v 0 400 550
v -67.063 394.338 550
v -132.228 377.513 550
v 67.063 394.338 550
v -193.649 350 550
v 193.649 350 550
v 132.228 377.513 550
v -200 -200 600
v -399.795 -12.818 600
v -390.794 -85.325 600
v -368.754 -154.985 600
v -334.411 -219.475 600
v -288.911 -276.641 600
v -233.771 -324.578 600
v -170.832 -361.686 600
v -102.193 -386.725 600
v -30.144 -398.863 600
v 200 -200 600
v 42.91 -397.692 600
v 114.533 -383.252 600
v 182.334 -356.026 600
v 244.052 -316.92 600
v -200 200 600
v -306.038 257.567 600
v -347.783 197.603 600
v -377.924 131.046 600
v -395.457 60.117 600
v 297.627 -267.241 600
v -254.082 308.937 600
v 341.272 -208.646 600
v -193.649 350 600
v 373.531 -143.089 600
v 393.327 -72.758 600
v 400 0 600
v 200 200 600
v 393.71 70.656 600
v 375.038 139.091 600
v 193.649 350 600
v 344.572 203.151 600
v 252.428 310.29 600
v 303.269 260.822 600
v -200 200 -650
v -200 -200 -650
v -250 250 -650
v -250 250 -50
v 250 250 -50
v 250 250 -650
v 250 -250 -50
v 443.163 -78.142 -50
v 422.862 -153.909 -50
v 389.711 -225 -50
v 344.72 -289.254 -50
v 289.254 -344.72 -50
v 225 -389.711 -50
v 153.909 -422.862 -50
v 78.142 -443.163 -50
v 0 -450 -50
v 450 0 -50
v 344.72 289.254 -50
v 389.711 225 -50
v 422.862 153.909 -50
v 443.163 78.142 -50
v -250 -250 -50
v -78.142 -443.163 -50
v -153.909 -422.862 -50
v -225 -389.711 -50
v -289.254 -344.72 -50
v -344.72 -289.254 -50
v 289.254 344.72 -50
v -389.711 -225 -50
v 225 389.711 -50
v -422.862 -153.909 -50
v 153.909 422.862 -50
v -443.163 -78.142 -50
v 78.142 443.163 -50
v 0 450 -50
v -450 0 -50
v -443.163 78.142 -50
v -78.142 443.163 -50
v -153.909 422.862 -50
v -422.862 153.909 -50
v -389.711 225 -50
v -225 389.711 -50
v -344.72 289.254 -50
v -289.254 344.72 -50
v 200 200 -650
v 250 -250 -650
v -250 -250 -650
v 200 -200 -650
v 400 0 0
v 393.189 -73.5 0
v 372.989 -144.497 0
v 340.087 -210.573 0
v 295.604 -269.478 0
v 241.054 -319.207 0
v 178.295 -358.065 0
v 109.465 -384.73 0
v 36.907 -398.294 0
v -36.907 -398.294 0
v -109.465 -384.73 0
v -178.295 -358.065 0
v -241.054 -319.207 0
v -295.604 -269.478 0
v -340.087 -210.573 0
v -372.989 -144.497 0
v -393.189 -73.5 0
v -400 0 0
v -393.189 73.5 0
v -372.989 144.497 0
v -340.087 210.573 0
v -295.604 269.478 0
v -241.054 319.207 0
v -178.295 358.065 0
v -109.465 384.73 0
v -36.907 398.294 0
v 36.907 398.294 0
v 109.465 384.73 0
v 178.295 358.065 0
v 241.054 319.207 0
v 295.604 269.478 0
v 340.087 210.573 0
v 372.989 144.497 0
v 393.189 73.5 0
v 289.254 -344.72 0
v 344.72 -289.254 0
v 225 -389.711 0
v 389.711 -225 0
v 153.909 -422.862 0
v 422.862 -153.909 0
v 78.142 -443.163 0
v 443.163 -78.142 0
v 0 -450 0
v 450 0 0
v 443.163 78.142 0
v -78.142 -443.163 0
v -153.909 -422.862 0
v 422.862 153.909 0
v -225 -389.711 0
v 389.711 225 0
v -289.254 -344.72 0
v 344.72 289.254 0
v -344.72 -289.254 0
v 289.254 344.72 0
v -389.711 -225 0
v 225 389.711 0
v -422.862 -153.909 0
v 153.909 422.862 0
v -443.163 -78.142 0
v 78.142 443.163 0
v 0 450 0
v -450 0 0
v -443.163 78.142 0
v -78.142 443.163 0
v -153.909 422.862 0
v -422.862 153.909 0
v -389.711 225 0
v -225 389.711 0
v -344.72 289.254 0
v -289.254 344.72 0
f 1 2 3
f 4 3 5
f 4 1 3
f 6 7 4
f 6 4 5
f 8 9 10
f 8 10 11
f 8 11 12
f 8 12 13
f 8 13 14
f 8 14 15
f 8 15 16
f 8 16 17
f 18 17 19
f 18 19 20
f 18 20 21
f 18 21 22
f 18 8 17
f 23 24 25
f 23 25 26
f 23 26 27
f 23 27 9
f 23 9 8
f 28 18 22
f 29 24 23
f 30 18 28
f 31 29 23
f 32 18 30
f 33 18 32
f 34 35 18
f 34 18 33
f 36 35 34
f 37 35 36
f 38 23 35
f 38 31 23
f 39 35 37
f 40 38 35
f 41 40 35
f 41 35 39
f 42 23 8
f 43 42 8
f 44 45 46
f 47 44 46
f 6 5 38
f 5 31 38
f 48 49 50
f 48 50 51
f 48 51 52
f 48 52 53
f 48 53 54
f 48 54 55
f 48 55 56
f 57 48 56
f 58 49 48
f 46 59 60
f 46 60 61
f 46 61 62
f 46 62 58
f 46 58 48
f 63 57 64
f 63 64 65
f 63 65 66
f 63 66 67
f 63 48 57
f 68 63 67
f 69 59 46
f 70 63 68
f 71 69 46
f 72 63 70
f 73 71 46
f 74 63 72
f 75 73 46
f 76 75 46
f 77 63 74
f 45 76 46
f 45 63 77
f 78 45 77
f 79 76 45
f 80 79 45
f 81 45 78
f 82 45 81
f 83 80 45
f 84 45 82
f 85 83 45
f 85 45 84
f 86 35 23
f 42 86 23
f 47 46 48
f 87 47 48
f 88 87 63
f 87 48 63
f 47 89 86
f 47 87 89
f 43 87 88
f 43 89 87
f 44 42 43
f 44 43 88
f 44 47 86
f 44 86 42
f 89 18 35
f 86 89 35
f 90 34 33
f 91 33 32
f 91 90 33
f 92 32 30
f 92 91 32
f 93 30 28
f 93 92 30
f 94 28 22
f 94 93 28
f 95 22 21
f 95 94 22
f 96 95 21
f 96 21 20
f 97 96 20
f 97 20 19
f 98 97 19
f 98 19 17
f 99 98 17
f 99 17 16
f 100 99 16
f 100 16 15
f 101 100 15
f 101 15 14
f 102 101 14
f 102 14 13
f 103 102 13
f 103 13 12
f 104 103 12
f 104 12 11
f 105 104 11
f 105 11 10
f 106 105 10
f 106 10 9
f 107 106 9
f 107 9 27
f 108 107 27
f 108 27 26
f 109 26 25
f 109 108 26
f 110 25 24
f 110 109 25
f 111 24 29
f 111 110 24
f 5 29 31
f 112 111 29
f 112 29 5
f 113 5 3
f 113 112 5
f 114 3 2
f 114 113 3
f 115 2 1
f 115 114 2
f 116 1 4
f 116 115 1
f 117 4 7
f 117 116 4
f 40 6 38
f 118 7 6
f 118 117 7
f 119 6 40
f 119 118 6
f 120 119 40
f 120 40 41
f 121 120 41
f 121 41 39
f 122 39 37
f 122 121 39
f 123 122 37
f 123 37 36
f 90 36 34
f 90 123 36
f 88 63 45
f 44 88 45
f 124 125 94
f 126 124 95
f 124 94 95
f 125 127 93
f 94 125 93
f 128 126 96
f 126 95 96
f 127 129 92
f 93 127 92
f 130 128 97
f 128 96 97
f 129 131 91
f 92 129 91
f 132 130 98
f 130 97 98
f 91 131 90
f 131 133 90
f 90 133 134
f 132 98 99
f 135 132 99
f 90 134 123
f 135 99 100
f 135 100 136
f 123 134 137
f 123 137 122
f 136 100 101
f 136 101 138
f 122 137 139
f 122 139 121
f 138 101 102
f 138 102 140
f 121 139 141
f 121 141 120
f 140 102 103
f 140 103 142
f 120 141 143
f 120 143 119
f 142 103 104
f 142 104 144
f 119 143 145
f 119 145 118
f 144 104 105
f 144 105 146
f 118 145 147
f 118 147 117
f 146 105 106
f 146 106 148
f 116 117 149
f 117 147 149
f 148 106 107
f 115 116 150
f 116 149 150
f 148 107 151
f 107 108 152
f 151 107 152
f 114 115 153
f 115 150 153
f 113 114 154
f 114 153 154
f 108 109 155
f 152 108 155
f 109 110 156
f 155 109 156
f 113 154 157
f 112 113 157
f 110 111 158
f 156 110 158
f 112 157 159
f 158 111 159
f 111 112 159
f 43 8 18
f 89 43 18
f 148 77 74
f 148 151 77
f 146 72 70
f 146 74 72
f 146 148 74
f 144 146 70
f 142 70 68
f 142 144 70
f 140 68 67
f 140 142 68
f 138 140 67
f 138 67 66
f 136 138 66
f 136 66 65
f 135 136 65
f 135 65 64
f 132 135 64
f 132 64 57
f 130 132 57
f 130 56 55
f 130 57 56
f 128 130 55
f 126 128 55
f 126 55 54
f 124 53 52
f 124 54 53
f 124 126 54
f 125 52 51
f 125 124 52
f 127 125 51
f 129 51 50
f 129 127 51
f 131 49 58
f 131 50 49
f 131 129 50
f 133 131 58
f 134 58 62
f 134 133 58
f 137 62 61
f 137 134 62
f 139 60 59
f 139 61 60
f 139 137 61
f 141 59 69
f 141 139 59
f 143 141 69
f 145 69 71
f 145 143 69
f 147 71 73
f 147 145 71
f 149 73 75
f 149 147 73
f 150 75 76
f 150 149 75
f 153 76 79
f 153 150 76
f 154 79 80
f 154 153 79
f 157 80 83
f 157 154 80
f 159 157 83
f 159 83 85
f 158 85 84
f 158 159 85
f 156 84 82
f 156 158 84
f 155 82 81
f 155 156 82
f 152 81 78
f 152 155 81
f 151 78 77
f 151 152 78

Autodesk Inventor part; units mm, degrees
ref_plane "YZ Plane" through (0, 0, 0) normal (1, 0, 0) x (0, 1, 0)
ref_plane "XZ Plane" through (0, 0, 0) normal (0, 1, 0) x (-1, 0, 0)
ref_plane "XY Plane" through (0, 0, 0) normal (0, 0, 1) x (1, 0, 0)
sketch "Náčrt1" plane through (0, 0, 0) normal (0, 0, 1) x (1, 0, 0)
  line L0 (-200, -200) -> (200, -200)
  line L1 (200, -200) -> (200, 200)
  line L2 (200, 200) -> (-200, 200)
  line L3 (-200, 200) -> (-200, -200)
  line L4 (-200, -200) -> (200, 200) construction
  line L5 (200, -200) -> (-200, 200) construction
  circle A0 centre (0, 0) radius 400
  dimension "d6" = 800
  dimension "d7" = 400
extrude "Vysunutí1" add sketch "Náčrt1" along normal blind 600
sketch "Náčrt2" plane through (0, 0, 0) normal (0, 0, -1) x (-1, 0, 0)
  line L0 (200, 200) -> (200, -200) projected
  line L1 (200, -200) -> (-200, -200) projected
  line L2 (-200, -200) -> (-200, 200) projected
  line L3 (-200, 200) -> (200, 200) projected
  circle A0 centre (0, 0) radius 400 projected
  circle A1 centre (0, 0) radius 450
  dimension "d8" = 900
extrude "Vysunutí2" add sketch "Náčrt2" along normal blind 50 contours A0 | A1
sketch "Náčrt3" plane through (0, 0, 600) normal (0, 0, 1) x (1, 0, 0)
  line L0 (251.7841, 450) -> (-248.2159, 450)
  line L1 (-248.2159, 450) -> (-248.2159, 350)
  line L2 (-248.2159, 350) -> (251.7841, 350)
  line L3 (251.7841, 350) -> (251.7841, 450)
  circle A0 centre (0, 0) radius 400 projected
  dimension "d11" = 350
  dimension "d12" = 100
  dimension "d13" = 500
extrude "Vysunutí3" cut sketch "Náčrt3" against normal blind 50 contours L3 L2 A0 L1 L0 | L2 A0 picked at (-56.548, 354.0814)
sketch "Náčrt4" plane through (0, 0, -50) normal (0, 0, -1) x (-1, 0, 0)
  line L0 (200, -200) -> (-200, -200) projected
  line L1 (200, 200) -> (200, -200) projected
  line L2 (-200, 200) -> (200, 200) projected
  line L3 (-200, -200) -> (-200, 200) projected
  line L4 (-250, -250) -> (250, -250)
  line L5 (250, -250) -> (250, 250)
  line L6 (250, 250) -> (-250, 250)
  line L7 (-250, 250) -> (-250, -250)
  point P0 (0, 0)
  dimension "d16" = 50
extrude "Vysunutí4" add sketch "Náčrt4" along normal blind 600
properties part number "B3-C"
